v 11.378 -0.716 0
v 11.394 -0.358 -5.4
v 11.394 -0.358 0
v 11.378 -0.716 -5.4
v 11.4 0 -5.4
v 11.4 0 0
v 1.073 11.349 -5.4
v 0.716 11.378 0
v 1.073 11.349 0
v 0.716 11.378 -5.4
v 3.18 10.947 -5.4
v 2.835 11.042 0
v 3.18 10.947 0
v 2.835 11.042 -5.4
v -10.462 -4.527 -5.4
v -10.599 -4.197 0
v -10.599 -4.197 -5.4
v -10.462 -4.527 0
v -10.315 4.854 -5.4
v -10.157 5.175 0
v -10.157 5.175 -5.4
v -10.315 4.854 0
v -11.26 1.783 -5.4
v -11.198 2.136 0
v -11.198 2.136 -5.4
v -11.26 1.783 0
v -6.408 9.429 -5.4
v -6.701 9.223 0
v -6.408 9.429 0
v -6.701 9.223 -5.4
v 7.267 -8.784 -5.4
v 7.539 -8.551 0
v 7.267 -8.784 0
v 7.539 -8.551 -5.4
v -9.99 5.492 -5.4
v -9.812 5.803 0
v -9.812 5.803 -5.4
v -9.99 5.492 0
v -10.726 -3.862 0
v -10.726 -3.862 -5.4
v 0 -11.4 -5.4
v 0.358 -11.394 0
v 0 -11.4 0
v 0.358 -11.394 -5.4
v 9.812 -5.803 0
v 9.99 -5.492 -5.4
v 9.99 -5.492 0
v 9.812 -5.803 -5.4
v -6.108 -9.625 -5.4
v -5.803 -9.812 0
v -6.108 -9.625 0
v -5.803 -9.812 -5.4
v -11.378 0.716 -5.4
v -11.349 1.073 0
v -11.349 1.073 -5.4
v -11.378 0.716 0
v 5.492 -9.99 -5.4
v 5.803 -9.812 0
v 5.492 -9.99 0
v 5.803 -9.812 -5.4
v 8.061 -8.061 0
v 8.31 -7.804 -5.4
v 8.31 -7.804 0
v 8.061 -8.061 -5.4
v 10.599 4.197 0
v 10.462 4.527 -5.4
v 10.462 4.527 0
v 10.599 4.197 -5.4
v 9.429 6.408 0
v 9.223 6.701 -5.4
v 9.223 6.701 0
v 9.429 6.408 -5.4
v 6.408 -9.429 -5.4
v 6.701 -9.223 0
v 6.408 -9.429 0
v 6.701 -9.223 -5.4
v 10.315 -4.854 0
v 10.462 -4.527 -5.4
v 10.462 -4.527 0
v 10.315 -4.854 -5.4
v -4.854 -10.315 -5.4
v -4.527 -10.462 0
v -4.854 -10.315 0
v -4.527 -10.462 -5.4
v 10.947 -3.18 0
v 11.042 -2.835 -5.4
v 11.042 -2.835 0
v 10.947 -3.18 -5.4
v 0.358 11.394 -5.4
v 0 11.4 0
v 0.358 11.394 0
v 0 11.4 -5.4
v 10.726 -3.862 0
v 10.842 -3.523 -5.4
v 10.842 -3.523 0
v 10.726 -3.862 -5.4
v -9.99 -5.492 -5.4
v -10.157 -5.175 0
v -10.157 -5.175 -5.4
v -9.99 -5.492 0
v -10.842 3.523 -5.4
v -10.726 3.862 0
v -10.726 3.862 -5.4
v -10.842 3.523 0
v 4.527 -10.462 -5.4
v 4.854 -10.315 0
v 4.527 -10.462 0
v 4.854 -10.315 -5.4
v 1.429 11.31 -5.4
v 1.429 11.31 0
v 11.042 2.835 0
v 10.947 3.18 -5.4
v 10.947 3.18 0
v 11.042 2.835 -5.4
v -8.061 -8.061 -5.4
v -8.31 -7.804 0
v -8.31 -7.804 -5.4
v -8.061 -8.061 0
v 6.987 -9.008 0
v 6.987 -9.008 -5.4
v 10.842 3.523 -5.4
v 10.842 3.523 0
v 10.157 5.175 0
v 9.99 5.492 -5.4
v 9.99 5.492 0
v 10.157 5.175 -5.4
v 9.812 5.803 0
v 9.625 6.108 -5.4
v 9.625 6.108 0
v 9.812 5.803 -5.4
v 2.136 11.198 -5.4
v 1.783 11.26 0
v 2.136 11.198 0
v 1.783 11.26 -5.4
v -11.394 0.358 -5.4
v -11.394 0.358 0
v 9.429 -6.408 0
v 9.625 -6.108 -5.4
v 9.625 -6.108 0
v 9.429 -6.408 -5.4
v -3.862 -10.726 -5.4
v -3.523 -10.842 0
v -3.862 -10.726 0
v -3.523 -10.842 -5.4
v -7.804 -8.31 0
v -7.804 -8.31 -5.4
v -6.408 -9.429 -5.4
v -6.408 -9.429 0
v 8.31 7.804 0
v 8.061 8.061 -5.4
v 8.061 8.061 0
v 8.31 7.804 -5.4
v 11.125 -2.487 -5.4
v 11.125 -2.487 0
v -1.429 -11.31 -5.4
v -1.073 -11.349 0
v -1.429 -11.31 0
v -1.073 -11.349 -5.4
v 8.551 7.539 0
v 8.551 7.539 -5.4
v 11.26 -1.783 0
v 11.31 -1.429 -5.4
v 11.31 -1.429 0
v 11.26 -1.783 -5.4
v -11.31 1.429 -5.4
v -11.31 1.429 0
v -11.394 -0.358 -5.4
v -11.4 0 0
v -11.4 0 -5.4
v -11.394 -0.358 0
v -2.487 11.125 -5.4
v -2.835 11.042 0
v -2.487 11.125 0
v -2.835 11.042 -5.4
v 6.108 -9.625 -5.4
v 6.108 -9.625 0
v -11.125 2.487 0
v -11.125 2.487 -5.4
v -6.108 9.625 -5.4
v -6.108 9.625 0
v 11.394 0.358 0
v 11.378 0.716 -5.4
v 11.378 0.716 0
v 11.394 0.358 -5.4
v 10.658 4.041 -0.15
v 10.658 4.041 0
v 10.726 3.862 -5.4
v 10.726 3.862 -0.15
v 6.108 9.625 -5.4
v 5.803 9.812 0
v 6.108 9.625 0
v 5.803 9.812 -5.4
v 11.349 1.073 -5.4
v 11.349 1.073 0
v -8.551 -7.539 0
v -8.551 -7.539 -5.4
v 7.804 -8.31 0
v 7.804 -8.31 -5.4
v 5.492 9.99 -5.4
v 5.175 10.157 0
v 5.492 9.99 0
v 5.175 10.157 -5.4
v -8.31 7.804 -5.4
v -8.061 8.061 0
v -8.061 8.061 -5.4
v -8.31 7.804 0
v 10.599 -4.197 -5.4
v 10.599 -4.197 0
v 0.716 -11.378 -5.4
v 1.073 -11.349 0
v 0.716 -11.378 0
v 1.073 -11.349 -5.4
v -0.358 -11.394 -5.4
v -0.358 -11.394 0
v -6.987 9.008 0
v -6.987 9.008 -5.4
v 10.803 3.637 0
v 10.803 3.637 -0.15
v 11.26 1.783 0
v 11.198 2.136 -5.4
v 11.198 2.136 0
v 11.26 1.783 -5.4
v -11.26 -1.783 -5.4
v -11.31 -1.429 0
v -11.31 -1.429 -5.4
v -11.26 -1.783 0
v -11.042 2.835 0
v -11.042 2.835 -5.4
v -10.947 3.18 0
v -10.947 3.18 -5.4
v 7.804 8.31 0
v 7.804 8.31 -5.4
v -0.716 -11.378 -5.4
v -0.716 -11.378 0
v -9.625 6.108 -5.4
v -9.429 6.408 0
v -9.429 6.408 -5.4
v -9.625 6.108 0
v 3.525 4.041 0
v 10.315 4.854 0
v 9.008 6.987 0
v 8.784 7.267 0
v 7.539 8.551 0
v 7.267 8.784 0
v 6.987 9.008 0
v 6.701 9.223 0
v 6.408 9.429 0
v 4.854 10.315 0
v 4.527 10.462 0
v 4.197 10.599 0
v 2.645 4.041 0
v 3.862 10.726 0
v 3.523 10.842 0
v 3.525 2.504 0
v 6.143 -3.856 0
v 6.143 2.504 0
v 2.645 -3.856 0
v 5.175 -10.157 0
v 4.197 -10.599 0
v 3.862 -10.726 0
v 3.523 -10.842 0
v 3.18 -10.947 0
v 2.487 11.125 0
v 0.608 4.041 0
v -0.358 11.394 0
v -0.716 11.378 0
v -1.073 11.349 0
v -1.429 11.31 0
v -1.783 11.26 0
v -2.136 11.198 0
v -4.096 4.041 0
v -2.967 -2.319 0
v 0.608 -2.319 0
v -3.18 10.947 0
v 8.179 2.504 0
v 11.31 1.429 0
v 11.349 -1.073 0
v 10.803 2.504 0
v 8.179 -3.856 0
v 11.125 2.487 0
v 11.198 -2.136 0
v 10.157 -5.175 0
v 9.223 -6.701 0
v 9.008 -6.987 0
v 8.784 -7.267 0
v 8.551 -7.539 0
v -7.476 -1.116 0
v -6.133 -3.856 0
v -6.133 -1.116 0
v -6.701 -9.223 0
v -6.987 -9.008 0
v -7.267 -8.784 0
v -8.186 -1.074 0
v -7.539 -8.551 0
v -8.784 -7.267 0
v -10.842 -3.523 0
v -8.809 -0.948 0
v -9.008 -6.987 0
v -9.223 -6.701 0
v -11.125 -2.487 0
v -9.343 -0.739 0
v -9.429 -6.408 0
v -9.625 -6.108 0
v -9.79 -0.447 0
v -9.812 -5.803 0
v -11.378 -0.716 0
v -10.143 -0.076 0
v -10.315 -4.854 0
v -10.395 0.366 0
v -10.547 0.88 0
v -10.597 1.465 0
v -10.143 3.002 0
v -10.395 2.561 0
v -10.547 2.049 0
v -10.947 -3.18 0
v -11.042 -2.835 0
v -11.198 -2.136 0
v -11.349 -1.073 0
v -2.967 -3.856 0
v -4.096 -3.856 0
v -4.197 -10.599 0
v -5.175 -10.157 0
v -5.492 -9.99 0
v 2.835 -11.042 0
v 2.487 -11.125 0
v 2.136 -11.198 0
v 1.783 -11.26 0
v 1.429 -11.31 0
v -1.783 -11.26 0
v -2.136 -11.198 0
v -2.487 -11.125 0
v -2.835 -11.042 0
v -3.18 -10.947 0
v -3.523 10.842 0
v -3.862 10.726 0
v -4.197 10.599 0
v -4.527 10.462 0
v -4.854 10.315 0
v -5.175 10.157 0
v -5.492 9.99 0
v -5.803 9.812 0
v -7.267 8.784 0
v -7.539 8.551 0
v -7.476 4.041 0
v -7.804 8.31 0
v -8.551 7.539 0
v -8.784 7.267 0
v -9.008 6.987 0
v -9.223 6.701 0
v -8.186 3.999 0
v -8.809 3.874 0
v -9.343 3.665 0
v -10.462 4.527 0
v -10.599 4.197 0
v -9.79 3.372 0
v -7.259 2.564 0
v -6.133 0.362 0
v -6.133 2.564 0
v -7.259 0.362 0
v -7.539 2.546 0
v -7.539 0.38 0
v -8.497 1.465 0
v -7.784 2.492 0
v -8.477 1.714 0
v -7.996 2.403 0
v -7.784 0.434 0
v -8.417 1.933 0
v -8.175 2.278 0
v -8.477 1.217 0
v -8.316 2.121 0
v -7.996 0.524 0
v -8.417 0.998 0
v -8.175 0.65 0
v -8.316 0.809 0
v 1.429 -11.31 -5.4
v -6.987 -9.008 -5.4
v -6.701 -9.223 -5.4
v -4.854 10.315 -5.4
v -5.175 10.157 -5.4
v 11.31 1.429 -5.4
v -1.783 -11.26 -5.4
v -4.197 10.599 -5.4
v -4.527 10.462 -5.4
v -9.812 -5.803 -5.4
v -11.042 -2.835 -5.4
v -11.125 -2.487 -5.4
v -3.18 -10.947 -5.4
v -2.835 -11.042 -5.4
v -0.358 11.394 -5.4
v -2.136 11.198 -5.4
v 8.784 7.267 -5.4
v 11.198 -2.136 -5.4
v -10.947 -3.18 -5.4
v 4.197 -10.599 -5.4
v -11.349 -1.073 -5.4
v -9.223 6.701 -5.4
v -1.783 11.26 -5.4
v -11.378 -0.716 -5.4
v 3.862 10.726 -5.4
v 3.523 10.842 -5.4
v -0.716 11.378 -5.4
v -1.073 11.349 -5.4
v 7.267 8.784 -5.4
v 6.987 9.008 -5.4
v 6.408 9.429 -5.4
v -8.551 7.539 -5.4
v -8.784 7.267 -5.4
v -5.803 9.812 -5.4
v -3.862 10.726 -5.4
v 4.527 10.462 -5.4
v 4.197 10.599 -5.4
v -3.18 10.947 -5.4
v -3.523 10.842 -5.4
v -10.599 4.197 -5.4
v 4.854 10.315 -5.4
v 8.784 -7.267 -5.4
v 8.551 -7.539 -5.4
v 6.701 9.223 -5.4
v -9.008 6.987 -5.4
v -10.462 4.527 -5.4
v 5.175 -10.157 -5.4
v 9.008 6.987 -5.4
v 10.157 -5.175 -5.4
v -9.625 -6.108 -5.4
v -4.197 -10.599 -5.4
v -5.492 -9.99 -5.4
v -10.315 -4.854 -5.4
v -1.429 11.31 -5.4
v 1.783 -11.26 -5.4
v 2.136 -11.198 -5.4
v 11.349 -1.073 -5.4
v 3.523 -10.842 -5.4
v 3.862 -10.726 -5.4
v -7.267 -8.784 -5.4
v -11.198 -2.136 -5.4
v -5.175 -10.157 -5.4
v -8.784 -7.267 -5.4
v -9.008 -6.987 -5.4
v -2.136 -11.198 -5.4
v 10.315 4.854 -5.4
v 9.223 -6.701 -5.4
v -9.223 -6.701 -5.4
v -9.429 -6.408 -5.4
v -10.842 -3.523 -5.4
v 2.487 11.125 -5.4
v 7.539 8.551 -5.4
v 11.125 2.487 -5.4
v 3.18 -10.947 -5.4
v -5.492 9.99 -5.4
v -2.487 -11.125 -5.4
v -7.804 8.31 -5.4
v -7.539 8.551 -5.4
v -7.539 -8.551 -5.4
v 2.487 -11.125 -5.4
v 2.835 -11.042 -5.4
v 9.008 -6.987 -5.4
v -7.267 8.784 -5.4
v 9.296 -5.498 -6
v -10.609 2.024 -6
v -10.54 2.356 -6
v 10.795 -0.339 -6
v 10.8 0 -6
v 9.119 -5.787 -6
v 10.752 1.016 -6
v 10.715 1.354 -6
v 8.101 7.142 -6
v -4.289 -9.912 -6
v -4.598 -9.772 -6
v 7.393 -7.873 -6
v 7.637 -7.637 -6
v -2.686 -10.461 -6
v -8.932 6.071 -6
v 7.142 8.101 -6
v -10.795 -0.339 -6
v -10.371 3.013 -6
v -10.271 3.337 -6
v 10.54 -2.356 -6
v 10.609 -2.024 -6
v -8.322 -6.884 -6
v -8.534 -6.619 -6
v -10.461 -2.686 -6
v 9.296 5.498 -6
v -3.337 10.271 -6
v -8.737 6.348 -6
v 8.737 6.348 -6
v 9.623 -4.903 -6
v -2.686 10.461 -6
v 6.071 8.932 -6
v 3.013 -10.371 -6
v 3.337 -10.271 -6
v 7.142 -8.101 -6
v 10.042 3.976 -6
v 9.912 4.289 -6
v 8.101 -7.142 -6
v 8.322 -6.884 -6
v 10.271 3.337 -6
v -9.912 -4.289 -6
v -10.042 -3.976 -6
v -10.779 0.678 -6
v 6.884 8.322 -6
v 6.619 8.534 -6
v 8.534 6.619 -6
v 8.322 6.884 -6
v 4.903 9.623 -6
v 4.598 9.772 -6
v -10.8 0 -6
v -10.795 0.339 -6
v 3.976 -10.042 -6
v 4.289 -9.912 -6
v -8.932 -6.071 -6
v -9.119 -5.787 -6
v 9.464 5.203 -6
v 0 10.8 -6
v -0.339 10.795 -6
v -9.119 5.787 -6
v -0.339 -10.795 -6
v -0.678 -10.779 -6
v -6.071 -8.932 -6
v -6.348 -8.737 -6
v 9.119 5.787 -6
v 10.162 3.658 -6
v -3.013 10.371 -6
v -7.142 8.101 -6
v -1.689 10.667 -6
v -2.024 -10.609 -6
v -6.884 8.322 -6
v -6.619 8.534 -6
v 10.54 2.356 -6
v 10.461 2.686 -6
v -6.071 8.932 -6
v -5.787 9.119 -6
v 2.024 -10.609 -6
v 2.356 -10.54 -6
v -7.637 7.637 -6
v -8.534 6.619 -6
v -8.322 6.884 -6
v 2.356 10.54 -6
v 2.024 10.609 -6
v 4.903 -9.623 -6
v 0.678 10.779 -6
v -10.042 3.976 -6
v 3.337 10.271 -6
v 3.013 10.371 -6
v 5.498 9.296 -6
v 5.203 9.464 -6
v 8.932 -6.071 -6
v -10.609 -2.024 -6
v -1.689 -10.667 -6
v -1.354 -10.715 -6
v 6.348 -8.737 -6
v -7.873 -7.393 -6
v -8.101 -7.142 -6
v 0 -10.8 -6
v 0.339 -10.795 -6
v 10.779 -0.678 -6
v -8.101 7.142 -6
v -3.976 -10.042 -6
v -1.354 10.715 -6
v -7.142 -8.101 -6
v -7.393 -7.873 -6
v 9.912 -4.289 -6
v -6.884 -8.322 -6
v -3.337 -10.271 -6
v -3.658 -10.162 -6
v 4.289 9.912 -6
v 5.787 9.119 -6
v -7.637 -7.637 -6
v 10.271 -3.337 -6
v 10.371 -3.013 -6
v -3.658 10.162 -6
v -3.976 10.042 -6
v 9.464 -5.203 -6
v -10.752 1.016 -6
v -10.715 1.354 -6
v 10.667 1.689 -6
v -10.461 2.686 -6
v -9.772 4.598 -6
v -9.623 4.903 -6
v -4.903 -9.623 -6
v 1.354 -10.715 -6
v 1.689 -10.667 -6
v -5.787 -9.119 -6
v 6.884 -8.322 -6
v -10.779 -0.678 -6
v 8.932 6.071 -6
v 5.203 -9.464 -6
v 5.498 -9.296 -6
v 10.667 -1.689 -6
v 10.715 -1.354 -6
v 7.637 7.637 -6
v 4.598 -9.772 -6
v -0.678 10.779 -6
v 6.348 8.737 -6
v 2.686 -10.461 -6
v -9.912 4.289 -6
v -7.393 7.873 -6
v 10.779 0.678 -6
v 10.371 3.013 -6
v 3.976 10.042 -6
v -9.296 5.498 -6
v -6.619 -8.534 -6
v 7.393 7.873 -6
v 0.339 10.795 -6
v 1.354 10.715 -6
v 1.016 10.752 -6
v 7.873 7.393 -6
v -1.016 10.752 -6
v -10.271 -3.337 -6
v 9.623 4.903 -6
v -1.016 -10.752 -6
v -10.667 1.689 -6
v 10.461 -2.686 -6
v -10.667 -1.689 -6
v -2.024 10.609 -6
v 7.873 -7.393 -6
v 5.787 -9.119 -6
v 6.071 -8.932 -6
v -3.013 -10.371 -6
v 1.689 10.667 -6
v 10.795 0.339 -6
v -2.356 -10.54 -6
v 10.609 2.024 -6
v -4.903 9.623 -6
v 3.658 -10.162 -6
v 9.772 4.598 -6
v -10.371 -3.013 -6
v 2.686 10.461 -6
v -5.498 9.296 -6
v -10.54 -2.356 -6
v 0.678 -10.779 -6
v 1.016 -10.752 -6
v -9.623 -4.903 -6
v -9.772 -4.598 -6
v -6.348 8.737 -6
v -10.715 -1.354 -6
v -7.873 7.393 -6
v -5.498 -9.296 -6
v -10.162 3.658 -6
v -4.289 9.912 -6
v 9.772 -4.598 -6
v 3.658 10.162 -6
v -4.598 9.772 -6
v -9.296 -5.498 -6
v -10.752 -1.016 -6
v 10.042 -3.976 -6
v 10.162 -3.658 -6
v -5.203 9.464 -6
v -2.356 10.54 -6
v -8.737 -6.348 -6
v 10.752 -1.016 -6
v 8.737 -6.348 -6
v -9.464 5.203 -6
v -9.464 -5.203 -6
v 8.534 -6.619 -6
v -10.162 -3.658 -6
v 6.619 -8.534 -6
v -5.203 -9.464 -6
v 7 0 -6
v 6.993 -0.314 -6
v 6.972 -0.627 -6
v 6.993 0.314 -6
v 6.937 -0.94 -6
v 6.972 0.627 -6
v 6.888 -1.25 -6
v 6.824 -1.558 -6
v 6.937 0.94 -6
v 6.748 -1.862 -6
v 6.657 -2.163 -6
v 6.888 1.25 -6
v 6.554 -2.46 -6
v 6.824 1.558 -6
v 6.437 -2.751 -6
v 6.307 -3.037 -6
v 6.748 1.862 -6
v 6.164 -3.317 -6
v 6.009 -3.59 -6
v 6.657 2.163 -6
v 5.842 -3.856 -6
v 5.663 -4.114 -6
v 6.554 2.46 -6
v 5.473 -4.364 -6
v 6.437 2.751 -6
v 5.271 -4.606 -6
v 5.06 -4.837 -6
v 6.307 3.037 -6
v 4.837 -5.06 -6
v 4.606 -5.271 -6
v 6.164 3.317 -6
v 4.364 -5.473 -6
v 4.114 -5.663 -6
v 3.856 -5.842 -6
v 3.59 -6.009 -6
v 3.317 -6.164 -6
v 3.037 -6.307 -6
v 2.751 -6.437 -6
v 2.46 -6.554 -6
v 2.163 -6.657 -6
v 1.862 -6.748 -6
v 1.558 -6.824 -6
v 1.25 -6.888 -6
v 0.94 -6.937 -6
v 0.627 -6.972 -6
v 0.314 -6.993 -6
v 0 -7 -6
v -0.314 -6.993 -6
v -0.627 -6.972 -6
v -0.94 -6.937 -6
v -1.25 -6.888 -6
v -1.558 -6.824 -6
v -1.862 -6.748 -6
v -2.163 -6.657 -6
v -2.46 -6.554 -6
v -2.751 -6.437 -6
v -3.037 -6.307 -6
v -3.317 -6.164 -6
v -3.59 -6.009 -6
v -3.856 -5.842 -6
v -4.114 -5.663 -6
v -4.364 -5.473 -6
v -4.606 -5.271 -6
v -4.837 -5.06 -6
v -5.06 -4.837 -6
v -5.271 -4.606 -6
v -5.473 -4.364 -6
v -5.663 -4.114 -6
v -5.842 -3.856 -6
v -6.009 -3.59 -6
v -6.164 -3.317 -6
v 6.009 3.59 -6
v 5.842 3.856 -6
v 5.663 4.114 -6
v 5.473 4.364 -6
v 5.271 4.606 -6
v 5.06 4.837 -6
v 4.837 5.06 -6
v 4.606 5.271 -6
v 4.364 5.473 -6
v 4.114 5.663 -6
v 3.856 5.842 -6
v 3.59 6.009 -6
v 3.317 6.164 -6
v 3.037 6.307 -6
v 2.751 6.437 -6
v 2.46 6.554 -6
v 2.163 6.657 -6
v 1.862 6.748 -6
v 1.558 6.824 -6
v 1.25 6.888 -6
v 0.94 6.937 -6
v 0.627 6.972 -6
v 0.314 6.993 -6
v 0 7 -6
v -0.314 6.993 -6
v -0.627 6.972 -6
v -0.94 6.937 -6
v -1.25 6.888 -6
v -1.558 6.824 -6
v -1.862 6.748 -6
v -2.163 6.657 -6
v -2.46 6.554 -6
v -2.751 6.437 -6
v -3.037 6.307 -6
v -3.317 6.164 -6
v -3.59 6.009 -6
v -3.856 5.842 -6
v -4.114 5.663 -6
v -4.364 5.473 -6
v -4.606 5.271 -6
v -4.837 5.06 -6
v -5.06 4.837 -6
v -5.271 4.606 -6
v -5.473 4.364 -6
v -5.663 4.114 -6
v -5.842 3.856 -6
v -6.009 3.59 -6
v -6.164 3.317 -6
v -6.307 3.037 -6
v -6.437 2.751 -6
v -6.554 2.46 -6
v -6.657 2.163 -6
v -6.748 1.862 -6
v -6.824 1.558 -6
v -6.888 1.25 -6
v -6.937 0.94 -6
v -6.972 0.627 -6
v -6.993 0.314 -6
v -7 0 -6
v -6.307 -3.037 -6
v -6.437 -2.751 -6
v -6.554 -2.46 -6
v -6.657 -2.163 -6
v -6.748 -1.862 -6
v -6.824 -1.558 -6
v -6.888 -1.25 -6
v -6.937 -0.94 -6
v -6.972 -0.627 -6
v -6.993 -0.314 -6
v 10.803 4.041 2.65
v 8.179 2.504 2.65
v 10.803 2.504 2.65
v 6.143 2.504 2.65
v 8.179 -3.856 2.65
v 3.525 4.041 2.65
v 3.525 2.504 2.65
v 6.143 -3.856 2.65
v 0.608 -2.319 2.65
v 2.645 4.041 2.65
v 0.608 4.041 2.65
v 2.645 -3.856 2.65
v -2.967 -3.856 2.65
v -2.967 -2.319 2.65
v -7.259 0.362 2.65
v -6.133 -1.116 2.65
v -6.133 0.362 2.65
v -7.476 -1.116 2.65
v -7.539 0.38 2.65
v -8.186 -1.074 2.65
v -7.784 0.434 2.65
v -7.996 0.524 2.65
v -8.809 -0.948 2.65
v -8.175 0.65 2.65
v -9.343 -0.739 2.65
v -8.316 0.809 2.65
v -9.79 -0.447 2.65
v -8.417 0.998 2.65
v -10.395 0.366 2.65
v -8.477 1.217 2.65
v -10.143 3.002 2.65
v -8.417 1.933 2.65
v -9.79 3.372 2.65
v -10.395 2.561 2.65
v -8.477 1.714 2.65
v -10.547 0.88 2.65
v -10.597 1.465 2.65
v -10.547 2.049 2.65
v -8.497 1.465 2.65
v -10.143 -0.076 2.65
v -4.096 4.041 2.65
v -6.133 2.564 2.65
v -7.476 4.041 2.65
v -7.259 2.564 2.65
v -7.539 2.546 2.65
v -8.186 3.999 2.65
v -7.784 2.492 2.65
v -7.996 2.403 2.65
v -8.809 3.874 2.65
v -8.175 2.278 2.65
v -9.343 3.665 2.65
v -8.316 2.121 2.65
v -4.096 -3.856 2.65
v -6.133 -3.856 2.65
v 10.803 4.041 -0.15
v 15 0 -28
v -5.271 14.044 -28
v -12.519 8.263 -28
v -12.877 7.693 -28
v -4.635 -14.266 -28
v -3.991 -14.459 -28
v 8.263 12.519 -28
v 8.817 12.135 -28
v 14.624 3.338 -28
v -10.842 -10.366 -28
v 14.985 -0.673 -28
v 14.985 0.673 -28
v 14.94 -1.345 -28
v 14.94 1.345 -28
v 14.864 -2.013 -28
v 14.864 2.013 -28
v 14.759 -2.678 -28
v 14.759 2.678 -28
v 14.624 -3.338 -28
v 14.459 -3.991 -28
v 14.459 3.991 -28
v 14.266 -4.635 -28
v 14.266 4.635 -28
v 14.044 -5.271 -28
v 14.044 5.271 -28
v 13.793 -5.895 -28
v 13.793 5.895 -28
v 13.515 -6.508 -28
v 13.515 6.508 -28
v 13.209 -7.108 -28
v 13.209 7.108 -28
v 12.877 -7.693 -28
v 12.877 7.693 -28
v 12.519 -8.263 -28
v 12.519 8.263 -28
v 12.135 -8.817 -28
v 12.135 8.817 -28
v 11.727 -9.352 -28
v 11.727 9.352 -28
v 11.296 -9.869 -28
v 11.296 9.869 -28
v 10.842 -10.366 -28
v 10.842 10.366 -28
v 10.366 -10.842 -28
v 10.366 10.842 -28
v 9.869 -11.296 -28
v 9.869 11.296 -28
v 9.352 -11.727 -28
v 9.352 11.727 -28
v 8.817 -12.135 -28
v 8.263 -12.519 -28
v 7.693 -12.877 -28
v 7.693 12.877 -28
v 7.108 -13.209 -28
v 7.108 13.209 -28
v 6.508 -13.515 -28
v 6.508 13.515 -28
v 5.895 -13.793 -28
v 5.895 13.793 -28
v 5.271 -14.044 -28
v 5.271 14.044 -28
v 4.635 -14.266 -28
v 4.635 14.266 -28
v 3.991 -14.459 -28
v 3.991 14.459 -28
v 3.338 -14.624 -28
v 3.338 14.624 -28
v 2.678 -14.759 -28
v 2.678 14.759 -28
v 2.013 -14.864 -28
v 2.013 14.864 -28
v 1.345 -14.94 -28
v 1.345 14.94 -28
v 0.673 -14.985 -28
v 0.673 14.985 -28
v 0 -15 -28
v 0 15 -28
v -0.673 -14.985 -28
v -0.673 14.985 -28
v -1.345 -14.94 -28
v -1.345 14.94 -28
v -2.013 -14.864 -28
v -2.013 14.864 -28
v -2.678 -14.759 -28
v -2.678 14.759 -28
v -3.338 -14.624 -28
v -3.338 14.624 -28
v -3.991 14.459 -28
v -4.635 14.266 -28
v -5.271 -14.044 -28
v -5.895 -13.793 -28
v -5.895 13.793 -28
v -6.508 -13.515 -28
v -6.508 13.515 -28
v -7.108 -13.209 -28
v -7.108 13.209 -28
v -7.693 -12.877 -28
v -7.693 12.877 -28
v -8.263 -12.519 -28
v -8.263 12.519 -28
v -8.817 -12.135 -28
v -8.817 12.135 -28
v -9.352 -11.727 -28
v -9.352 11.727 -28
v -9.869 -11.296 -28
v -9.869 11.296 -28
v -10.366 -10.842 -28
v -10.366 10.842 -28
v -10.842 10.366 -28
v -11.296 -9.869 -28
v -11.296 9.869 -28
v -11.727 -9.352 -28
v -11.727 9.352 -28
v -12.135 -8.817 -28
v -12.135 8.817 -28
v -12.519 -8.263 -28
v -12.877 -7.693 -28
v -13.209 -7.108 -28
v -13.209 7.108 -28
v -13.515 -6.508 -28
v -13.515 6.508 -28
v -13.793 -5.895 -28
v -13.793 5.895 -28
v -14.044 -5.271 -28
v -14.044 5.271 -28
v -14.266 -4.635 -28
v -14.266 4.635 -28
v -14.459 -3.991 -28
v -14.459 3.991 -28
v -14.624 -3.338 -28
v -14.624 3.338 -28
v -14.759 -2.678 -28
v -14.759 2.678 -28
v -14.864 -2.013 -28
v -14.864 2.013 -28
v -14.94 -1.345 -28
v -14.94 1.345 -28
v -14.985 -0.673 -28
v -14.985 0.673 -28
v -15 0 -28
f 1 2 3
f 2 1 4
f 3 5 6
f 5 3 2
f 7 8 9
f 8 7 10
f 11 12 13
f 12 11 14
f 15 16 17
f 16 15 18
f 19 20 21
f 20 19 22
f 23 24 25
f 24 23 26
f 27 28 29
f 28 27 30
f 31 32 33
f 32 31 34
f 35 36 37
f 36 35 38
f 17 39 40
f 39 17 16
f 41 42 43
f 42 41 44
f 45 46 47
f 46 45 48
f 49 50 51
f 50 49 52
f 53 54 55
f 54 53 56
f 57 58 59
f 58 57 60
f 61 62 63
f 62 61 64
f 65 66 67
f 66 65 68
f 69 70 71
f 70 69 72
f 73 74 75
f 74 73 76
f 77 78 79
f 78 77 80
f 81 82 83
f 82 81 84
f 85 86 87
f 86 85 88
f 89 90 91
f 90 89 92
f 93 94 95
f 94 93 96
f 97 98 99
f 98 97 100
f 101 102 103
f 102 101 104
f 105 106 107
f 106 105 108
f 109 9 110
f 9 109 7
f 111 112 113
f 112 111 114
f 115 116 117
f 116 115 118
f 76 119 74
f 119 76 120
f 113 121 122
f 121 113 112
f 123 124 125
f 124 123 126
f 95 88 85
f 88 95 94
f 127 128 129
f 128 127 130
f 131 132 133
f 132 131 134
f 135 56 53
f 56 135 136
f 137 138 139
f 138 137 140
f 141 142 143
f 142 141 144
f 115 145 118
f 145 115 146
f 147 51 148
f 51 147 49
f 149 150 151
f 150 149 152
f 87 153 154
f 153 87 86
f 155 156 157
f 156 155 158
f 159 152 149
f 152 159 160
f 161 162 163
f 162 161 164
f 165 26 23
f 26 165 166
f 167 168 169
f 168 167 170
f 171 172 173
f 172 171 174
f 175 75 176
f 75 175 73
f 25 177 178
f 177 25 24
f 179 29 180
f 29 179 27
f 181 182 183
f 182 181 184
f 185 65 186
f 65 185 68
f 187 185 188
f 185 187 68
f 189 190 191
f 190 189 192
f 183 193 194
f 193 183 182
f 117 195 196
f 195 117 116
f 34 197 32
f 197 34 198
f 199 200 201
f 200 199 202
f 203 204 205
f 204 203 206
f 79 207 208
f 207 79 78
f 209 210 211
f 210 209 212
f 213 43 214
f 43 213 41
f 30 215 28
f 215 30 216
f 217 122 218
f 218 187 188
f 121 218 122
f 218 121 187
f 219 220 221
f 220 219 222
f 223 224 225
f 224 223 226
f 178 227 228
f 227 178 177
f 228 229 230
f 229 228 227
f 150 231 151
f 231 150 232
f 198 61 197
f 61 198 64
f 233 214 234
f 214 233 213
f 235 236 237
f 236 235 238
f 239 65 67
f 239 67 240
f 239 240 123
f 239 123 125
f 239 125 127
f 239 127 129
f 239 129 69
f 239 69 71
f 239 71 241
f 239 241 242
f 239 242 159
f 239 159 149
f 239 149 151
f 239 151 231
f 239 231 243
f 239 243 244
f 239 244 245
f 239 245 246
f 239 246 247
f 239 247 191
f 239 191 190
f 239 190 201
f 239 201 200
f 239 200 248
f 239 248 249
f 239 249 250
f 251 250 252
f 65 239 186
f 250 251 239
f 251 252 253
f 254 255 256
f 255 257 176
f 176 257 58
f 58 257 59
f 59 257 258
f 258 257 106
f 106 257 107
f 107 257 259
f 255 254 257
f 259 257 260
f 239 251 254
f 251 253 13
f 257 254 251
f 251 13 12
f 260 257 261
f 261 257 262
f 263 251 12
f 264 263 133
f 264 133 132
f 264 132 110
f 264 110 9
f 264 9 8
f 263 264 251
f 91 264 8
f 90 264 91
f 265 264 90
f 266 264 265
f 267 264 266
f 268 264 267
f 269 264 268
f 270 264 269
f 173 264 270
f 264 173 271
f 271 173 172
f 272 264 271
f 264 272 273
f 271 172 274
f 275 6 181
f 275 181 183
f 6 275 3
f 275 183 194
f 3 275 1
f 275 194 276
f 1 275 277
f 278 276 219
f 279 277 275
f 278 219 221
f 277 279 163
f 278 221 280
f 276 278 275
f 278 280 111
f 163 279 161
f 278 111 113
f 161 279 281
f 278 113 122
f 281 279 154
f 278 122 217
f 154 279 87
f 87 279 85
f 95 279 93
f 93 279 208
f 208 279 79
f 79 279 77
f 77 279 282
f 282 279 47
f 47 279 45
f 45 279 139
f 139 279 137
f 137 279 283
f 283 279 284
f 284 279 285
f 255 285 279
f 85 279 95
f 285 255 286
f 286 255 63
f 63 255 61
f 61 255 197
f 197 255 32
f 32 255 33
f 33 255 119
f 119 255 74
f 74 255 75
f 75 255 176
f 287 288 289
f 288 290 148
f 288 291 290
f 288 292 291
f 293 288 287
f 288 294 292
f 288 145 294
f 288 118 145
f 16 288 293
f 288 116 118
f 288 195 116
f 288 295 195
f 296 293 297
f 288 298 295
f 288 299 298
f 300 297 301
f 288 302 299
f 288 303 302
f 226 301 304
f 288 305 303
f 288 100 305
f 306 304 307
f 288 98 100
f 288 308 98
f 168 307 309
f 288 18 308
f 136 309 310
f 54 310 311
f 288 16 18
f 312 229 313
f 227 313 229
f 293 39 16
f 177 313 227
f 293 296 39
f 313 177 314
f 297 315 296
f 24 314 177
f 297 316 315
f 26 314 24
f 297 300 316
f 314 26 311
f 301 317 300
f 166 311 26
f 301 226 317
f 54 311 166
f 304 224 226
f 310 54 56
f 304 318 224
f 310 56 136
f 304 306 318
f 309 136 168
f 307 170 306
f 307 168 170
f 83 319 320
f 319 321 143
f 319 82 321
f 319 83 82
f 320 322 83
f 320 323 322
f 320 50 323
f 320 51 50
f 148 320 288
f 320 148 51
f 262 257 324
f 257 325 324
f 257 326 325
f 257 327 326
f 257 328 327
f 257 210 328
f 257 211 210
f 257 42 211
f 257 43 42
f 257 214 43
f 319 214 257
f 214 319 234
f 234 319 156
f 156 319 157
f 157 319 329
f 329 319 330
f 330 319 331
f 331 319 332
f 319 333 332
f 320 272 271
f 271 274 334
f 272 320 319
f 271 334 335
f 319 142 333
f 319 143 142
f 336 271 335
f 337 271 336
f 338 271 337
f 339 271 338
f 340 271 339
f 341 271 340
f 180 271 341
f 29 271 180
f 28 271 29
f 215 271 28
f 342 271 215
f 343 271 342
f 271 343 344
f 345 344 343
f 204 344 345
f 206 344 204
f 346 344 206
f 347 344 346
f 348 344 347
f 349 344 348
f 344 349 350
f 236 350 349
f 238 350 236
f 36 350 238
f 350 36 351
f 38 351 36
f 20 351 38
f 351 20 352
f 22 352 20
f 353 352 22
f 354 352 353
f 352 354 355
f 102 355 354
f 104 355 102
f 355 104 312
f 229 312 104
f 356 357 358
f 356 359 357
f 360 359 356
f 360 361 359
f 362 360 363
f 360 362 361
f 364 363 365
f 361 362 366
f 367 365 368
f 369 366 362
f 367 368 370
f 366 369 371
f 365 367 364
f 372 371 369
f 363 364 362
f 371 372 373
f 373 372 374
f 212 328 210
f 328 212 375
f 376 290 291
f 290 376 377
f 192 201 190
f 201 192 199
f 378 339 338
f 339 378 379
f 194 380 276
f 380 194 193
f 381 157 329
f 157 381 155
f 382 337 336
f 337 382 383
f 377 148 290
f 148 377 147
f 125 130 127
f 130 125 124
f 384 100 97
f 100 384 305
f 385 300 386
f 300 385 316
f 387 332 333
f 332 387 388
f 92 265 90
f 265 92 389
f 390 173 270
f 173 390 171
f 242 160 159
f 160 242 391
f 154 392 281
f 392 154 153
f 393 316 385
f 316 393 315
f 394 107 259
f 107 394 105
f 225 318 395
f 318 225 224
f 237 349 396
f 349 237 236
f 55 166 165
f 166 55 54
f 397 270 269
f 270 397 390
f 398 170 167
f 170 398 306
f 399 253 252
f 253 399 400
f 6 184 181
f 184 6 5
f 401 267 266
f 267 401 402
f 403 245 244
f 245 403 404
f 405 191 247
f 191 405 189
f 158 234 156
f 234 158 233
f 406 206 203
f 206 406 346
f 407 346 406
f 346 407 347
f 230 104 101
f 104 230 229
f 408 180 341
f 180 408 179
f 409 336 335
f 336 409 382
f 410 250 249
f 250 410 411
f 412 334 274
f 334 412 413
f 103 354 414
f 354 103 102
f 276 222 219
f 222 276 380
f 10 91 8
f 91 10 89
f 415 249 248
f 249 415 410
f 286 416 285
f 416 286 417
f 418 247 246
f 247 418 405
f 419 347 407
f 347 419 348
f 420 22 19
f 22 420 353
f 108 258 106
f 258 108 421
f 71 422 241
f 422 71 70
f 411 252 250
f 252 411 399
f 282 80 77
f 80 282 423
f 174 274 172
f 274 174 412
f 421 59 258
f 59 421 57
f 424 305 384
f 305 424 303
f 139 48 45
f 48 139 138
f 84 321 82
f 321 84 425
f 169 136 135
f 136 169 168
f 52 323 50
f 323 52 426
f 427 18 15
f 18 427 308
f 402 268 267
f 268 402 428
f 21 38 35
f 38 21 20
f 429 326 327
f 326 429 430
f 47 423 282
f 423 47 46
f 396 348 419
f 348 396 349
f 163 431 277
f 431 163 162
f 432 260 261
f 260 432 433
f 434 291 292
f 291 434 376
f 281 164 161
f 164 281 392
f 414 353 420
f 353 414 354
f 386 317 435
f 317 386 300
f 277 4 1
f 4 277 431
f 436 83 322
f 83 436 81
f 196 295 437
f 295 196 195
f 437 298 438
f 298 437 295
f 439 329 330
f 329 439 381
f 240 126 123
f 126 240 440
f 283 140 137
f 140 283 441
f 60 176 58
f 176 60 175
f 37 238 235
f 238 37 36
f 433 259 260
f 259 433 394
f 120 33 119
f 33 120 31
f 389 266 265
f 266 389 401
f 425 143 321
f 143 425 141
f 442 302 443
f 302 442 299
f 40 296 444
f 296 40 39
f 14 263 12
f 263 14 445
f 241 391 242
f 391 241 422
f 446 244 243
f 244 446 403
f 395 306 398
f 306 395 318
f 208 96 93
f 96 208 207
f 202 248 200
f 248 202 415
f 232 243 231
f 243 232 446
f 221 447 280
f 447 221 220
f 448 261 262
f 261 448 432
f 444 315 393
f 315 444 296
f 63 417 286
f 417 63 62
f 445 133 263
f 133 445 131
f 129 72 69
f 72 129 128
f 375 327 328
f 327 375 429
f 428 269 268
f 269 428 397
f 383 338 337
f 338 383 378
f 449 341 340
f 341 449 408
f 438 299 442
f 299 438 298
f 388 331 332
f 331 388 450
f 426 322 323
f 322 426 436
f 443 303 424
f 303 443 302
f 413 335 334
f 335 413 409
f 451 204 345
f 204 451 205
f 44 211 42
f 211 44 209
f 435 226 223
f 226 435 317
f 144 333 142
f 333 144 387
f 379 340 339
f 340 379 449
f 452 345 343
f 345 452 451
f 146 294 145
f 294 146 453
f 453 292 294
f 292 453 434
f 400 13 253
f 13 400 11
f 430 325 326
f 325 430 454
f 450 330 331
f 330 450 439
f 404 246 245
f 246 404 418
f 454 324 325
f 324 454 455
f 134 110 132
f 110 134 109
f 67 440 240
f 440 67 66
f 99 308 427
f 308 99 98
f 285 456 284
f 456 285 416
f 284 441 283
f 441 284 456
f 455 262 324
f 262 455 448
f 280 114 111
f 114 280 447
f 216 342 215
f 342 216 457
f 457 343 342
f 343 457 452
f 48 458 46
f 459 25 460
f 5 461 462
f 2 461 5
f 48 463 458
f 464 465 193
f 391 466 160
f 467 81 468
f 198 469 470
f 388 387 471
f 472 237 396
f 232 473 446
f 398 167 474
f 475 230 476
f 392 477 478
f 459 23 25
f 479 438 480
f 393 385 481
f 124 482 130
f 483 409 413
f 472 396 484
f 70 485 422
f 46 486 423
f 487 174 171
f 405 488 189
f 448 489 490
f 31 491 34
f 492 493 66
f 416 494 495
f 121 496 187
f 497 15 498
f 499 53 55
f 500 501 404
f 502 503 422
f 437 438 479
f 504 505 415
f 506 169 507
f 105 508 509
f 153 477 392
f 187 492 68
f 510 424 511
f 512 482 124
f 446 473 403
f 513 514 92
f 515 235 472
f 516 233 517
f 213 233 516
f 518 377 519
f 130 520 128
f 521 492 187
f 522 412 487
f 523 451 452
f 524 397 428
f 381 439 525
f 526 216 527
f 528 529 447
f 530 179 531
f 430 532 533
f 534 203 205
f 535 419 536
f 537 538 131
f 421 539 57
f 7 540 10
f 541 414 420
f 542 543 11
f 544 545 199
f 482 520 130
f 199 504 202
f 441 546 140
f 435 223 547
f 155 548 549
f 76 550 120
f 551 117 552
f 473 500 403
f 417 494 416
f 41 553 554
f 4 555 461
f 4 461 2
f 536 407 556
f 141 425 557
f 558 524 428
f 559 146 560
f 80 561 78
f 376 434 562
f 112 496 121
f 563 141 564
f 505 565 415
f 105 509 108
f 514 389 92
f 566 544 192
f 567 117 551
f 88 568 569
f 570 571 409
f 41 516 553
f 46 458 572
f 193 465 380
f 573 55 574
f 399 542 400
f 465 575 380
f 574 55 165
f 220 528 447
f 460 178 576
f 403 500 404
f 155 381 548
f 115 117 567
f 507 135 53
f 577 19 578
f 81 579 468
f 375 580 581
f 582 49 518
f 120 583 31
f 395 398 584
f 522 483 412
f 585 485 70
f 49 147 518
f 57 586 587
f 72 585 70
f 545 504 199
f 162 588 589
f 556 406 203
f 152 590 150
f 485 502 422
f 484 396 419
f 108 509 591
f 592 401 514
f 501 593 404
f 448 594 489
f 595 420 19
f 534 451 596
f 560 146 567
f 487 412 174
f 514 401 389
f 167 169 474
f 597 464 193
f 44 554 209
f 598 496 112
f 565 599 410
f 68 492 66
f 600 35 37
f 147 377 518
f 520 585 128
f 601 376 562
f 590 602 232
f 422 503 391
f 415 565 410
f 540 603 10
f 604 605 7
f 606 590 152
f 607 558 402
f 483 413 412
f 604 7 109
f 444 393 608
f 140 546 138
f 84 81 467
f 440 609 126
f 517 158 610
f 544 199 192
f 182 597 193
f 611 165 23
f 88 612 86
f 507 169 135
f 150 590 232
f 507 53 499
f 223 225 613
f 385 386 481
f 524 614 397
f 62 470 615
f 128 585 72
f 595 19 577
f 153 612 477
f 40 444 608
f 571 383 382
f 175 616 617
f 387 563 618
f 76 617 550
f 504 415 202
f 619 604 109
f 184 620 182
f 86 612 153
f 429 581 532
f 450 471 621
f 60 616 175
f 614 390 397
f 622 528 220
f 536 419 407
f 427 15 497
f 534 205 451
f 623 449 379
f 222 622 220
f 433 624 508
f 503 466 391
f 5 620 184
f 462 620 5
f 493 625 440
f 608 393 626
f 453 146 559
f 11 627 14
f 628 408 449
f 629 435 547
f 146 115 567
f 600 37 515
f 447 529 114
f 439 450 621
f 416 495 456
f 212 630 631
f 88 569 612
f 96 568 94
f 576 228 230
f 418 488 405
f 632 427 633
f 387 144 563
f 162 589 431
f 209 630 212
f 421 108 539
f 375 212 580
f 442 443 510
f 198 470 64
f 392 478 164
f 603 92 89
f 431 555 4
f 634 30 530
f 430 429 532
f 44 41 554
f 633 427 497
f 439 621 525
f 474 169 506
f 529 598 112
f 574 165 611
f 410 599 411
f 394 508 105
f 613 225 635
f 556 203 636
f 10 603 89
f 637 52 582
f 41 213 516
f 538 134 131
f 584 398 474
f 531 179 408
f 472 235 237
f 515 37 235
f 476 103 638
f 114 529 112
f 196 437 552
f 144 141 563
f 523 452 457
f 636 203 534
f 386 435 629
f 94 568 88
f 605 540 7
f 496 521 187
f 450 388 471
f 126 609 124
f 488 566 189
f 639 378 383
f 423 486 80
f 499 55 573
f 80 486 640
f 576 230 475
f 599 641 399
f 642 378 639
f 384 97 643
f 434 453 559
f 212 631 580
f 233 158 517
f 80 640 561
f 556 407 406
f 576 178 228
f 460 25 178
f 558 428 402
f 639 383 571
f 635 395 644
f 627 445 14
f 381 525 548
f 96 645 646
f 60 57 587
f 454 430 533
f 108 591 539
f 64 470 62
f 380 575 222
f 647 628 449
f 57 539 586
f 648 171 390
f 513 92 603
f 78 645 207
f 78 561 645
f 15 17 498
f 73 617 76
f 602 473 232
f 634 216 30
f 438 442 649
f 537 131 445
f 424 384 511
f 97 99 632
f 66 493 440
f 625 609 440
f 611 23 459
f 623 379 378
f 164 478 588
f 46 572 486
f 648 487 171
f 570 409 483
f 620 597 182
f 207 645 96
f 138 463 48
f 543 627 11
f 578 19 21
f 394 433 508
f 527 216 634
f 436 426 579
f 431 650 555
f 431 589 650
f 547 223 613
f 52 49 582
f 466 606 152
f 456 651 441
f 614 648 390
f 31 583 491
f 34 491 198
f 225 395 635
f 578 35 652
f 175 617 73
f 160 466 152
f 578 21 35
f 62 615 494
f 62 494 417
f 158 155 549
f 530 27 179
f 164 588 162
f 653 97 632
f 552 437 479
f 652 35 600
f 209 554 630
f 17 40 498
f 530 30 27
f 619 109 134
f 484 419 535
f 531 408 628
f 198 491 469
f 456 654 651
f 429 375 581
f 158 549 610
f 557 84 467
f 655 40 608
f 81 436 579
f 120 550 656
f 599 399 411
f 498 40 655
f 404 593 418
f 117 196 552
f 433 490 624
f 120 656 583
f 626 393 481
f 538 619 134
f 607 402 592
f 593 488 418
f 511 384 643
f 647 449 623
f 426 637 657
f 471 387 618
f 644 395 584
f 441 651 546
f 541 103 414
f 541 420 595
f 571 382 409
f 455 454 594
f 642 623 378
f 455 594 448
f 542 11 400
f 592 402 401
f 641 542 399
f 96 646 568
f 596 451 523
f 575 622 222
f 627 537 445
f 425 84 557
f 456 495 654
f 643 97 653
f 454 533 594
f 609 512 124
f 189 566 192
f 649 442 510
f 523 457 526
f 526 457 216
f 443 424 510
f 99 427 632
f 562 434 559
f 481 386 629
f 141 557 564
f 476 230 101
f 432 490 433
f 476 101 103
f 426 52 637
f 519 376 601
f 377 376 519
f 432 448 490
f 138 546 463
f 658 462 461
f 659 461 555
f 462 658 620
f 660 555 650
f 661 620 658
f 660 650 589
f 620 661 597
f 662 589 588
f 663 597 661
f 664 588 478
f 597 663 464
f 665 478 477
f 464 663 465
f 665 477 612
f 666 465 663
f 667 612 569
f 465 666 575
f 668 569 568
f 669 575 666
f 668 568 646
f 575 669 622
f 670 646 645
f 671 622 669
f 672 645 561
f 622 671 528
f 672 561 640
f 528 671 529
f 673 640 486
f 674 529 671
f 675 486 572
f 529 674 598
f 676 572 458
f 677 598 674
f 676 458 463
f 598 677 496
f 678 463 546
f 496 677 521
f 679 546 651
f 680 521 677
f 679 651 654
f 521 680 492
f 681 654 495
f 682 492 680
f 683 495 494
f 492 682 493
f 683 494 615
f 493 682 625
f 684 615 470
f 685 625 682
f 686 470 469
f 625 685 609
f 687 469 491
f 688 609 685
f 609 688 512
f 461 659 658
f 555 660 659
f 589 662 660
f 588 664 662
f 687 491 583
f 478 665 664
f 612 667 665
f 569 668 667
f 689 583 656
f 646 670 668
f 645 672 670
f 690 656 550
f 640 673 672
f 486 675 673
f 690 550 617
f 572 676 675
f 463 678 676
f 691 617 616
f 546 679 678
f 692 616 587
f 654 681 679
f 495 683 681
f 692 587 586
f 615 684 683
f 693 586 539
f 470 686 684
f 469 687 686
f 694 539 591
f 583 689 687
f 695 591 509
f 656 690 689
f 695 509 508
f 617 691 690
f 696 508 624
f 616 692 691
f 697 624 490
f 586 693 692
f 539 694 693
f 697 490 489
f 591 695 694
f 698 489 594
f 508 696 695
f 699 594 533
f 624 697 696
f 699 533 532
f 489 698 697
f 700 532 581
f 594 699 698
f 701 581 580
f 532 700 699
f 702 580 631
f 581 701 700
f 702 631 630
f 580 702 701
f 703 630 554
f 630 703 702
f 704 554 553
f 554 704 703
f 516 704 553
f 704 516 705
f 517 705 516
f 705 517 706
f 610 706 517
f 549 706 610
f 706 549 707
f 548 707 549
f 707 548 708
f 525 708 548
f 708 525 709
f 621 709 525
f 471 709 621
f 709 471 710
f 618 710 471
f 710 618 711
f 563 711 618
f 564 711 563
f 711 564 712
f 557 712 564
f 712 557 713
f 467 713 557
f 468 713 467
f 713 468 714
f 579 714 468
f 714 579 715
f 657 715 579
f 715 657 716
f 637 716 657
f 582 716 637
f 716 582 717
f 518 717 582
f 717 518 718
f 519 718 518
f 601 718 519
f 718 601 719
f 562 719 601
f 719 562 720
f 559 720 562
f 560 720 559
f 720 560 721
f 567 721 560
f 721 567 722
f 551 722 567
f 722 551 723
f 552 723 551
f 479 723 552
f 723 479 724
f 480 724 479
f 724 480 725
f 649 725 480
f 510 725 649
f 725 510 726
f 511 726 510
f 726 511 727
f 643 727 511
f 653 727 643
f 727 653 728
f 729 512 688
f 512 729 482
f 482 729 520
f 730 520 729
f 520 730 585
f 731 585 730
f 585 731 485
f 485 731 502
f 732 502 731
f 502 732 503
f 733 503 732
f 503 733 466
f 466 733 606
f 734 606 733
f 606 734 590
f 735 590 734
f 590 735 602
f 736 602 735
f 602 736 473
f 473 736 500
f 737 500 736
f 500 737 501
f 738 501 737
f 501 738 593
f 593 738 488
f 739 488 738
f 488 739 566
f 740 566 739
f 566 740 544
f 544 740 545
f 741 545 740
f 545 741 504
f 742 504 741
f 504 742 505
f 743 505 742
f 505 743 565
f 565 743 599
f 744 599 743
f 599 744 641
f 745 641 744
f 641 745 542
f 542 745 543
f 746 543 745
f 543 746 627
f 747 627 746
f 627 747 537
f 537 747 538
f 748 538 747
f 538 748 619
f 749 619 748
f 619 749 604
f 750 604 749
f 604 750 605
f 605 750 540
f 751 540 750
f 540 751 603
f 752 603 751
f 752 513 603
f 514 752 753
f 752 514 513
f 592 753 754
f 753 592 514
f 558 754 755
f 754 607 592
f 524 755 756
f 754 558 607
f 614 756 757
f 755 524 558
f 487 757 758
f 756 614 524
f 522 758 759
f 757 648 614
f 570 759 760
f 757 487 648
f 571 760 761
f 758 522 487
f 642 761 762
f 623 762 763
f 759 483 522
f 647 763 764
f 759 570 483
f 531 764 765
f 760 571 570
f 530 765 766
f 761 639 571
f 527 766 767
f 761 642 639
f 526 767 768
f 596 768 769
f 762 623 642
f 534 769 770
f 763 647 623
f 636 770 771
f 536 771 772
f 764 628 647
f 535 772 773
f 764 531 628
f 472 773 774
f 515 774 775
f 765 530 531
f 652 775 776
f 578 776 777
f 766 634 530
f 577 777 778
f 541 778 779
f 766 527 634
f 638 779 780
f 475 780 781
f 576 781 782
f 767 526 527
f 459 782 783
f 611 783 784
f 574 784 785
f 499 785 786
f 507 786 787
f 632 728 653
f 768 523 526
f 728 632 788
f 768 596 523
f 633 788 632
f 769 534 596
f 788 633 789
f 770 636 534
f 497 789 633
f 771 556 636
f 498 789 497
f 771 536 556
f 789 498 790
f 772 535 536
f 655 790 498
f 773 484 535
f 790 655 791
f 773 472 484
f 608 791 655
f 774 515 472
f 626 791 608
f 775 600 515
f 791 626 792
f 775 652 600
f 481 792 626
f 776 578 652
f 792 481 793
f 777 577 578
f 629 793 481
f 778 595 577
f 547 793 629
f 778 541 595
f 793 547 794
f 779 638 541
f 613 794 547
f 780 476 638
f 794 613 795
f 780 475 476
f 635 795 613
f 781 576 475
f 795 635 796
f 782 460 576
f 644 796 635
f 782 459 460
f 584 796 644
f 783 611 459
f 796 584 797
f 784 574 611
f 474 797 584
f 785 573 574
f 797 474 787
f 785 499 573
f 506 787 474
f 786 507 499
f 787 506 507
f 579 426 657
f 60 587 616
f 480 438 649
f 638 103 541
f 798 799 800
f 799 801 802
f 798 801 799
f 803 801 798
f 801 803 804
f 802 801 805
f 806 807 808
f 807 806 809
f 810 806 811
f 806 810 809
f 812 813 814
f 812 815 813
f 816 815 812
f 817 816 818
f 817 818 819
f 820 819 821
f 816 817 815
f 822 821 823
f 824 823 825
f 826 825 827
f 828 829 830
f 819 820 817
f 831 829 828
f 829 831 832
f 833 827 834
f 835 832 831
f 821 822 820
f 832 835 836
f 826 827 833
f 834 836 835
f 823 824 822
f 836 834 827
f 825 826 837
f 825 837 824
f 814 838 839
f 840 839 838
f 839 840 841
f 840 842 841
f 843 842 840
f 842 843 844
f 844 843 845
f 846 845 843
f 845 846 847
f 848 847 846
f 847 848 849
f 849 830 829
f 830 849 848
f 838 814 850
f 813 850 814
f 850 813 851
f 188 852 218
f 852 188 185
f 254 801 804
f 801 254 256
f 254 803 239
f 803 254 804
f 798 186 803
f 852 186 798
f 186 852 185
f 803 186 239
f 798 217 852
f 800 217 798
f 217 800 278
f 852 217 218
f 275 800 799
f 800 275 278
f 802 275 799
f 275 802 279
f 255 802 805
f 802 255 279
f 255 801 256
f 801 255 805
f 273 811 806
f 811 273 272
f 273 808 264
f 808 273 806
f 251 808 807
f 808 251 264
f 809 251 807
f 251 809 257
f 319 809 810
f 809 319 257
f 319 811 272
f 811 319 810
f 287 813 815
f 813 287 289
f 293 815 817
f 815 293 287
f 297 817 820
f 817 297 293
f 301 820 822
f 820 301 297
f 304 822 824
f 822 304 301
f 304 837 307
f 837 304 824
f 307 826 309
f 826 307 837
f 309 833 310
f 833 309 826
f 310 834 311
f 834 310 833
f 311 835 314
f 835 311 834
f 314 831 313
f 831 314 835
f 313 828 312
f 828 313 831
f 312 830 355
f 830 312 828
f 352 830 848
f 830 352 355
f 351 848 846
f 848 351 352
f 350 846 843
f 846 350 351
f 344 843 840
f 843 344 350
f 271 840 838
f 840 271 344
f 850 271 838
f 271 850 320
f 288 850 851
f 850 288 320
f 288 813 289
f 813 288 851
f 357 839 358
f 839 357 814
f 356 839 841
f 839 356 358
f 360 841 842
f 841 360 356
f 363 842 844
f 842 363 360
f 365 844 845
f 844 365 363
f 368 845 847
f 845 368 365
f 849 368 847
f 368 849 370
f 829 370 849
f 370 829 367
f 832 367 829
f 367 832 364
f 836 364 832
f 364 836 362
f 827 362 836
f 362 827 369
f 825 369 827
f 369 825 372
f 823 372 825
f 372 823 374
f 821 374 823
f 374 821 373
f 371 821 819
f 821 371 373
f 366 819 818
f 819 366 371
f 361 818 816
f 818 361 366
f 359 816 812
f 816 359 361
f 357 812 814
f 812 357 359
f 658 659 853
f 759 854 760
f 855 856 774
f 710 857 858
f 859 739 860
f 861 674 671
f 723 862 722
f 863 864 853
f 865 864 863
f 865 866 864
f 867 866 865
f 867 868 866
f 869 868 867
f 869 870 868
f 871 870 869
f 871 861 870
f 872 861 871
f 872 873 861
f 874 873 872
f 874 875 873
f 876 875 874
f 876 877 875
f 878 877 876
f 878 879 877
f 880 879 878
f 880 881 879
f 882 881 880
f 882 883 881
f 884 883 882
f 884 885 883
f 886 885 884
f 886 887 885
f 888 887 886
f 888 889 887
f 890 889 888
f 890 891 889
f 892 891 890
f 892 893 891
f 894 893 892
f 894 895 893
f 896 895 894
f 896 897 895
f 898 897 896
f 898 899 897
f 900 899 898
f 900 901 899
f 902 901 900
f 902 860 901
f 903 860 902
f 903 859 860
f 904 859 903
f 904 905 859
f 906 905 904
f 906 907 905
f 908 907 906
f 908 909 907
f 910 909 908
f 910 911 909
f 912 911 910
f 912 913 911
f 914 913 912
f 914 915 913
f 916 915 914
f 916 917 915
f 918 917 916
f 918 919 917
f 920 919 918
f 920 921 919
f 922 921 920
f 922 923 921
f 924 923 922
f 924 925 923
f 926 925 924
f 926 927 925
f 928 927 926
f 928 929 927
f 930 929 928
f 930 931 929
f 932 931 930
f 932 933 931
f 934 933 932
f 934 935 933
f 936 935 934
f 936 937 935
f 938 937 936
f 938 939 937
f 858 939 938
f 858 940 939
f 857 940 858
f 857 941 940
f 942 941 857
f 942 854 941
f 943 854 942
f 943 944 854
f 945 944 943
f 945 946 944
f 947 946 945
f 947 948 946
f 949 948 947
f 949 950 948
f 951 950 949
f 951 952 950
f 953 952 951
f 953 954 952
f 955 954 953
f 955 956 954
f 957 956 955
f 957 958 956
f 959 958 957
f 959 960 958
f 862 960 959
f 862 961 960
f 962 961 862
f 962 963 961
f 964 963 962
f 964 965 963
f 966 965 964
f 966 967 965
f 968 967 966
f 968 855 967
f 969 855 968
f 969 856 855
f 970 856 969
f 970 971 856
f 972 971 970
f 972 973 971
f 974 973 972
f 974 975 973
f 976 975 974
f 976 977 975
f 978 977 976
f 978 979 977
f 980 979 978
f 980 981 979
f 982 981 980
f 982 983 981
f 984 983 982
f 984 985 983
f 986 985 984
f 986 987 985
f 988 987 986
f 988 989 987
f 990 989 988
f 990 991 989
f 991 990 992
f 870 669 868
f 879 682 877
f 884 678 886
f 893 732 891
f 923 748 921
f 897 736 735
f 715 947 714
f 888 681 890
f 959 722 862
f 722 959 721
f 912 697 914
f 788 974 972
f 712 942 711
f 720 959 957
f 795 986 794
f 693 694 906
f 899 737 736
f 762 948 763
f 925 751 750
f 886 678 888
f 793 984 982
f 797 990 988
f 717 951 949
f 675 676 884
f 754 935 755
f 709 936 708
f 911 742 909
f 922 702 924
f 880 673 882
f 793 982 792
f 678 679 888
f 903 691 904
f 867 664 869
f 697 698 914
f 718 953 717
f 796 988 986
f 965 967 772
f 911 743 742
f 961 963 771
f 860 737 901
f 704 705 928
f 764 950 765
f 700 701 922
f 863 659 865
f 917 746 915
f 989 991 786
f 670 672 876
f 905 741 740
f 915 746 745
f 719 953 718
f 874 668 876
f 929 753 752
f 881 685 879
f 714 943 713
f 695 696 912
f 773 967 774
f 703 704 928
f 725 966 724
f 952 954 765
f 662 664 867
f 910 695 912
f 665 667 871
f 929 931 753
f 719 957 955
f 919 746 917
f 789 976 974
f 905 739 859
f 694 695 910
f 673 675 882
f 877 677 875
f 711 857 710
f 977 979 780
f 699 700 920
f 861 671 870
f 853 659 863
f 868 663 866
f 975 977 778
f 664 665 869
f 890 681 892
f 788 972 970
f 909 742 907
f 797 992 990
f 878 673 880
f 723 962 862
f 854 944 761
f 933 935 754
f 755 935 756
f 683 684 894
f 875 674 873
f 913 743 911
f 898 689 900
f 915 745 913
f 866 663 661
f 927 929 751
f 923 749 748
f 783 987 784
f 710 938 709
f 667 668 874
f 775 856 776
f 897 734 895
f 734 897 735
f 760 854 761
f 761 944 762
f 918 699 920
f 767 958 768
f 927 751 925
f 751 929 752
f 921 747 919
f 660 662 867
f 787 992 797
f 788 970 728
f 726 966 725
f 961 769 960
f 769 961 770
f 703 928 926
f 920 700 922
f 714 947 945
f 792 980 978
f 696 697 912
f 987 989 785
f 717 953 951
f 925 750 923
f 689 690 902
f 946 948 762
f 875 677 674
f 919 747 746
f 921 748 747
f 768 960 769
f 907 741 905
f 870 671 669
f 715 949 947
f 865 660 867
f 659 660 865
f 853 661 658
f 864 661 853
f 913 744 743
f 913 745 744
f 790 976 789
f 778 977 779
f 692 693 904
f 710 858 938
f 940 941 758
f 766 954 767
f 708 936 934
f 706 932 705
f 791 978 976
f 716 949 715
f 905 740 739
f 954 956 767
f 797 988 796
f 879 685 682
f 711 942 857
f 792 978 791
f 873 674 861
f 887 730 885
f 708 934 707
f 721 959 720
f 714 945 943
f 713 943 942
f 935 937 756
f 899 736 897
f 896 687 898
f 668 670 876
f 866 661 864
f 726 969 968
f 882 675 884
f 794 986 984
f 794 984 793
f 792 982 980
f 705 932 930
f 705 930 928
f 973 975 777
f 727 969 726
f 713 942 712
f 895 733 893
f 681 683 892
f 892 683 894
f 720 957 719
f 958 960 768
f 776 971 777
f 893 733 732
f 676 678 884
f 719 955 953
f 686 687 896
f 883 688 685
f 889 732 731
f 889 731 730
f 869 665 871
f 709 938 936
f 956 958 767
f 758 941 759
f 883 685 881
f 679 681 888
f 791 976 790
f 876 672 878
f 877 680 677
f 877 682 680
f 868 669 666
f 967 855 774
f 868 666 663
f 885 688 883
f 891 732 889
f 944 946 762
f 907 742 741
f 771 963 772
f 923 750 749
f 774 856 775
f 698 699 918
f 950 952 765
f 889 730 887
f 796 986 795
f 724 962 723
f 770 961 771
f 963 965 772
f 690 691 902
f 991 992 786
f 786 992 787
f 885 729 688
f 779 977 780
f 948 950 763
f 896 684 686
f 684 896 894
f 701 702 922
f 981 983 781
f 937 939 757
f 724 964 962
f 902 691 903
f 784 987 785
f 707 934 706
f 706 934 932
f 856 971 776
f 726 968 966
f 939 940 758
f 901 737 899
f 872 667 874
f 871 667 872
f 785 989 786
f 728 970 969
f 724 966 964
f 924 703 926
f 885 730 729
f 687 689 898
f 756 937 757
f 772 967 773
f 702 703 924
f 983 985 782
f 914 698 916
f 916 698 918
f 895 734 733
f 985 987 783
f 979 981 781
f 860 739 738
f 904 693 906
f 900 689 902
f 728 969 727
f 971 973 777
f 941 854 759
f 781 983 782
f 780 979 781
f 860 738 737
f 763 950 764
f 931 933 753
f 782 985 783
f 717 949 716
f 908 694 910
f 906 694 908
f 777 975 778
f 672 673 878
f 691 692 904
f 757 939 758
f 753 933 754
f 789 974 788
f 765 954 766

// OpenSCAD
// TLP Pottery Stamp v8 (bigger base, SAME text size)
scale_factor = 0.6;   // 75% = 25% smaller
stamp_diameter = 38 * scale_factor;   // Increased base only
base_thickness = 6;
letter_height  = 2.8;
text_size      = 13* scale_factor;   // KEEP TEXT SAME SIZE

handle_base_d  = 14;//18;
handle_top_d   = 30;//30;
handle_height  = 22;

module base_disk() {
    union() {
        cylinder(d=stamp_diameter, h=base_thickness-0.6, $fn=200);
        translate([0,0,base_thickness-0.6])
            cylinder(d1=stamp_diameter, d2=stamp_diameter-1.2, h=0.6, $fn=200);
    }
}

module stamp_text() {
    // Letters extrude DOWN so they contact clay first
    translate([0,0,0.15])
        mirror([0,1,0])
            mirror([1,0,0])
                translate([0,0,-letter_height])
                    linear_extrude(height=letter_height)
                        //text("T\u2665C",
                            text("TLP",
                             size=text_size,
                             halign="center",
                             valign="center",
                             font="DejaVu Sans:style=Bold",
                             spacing=1.0);
}

module mushroom_handle() {
    translate([0,0,base_thickness])
        cylinder(d1=handle_base_d, d2=handle_top_d, h=handle_height, $fn=140);
}

render(convexity=10)
rotate([180,0,0])
union() {
    base_disk();
    stamp_text();
    mushroom_handle();
}
